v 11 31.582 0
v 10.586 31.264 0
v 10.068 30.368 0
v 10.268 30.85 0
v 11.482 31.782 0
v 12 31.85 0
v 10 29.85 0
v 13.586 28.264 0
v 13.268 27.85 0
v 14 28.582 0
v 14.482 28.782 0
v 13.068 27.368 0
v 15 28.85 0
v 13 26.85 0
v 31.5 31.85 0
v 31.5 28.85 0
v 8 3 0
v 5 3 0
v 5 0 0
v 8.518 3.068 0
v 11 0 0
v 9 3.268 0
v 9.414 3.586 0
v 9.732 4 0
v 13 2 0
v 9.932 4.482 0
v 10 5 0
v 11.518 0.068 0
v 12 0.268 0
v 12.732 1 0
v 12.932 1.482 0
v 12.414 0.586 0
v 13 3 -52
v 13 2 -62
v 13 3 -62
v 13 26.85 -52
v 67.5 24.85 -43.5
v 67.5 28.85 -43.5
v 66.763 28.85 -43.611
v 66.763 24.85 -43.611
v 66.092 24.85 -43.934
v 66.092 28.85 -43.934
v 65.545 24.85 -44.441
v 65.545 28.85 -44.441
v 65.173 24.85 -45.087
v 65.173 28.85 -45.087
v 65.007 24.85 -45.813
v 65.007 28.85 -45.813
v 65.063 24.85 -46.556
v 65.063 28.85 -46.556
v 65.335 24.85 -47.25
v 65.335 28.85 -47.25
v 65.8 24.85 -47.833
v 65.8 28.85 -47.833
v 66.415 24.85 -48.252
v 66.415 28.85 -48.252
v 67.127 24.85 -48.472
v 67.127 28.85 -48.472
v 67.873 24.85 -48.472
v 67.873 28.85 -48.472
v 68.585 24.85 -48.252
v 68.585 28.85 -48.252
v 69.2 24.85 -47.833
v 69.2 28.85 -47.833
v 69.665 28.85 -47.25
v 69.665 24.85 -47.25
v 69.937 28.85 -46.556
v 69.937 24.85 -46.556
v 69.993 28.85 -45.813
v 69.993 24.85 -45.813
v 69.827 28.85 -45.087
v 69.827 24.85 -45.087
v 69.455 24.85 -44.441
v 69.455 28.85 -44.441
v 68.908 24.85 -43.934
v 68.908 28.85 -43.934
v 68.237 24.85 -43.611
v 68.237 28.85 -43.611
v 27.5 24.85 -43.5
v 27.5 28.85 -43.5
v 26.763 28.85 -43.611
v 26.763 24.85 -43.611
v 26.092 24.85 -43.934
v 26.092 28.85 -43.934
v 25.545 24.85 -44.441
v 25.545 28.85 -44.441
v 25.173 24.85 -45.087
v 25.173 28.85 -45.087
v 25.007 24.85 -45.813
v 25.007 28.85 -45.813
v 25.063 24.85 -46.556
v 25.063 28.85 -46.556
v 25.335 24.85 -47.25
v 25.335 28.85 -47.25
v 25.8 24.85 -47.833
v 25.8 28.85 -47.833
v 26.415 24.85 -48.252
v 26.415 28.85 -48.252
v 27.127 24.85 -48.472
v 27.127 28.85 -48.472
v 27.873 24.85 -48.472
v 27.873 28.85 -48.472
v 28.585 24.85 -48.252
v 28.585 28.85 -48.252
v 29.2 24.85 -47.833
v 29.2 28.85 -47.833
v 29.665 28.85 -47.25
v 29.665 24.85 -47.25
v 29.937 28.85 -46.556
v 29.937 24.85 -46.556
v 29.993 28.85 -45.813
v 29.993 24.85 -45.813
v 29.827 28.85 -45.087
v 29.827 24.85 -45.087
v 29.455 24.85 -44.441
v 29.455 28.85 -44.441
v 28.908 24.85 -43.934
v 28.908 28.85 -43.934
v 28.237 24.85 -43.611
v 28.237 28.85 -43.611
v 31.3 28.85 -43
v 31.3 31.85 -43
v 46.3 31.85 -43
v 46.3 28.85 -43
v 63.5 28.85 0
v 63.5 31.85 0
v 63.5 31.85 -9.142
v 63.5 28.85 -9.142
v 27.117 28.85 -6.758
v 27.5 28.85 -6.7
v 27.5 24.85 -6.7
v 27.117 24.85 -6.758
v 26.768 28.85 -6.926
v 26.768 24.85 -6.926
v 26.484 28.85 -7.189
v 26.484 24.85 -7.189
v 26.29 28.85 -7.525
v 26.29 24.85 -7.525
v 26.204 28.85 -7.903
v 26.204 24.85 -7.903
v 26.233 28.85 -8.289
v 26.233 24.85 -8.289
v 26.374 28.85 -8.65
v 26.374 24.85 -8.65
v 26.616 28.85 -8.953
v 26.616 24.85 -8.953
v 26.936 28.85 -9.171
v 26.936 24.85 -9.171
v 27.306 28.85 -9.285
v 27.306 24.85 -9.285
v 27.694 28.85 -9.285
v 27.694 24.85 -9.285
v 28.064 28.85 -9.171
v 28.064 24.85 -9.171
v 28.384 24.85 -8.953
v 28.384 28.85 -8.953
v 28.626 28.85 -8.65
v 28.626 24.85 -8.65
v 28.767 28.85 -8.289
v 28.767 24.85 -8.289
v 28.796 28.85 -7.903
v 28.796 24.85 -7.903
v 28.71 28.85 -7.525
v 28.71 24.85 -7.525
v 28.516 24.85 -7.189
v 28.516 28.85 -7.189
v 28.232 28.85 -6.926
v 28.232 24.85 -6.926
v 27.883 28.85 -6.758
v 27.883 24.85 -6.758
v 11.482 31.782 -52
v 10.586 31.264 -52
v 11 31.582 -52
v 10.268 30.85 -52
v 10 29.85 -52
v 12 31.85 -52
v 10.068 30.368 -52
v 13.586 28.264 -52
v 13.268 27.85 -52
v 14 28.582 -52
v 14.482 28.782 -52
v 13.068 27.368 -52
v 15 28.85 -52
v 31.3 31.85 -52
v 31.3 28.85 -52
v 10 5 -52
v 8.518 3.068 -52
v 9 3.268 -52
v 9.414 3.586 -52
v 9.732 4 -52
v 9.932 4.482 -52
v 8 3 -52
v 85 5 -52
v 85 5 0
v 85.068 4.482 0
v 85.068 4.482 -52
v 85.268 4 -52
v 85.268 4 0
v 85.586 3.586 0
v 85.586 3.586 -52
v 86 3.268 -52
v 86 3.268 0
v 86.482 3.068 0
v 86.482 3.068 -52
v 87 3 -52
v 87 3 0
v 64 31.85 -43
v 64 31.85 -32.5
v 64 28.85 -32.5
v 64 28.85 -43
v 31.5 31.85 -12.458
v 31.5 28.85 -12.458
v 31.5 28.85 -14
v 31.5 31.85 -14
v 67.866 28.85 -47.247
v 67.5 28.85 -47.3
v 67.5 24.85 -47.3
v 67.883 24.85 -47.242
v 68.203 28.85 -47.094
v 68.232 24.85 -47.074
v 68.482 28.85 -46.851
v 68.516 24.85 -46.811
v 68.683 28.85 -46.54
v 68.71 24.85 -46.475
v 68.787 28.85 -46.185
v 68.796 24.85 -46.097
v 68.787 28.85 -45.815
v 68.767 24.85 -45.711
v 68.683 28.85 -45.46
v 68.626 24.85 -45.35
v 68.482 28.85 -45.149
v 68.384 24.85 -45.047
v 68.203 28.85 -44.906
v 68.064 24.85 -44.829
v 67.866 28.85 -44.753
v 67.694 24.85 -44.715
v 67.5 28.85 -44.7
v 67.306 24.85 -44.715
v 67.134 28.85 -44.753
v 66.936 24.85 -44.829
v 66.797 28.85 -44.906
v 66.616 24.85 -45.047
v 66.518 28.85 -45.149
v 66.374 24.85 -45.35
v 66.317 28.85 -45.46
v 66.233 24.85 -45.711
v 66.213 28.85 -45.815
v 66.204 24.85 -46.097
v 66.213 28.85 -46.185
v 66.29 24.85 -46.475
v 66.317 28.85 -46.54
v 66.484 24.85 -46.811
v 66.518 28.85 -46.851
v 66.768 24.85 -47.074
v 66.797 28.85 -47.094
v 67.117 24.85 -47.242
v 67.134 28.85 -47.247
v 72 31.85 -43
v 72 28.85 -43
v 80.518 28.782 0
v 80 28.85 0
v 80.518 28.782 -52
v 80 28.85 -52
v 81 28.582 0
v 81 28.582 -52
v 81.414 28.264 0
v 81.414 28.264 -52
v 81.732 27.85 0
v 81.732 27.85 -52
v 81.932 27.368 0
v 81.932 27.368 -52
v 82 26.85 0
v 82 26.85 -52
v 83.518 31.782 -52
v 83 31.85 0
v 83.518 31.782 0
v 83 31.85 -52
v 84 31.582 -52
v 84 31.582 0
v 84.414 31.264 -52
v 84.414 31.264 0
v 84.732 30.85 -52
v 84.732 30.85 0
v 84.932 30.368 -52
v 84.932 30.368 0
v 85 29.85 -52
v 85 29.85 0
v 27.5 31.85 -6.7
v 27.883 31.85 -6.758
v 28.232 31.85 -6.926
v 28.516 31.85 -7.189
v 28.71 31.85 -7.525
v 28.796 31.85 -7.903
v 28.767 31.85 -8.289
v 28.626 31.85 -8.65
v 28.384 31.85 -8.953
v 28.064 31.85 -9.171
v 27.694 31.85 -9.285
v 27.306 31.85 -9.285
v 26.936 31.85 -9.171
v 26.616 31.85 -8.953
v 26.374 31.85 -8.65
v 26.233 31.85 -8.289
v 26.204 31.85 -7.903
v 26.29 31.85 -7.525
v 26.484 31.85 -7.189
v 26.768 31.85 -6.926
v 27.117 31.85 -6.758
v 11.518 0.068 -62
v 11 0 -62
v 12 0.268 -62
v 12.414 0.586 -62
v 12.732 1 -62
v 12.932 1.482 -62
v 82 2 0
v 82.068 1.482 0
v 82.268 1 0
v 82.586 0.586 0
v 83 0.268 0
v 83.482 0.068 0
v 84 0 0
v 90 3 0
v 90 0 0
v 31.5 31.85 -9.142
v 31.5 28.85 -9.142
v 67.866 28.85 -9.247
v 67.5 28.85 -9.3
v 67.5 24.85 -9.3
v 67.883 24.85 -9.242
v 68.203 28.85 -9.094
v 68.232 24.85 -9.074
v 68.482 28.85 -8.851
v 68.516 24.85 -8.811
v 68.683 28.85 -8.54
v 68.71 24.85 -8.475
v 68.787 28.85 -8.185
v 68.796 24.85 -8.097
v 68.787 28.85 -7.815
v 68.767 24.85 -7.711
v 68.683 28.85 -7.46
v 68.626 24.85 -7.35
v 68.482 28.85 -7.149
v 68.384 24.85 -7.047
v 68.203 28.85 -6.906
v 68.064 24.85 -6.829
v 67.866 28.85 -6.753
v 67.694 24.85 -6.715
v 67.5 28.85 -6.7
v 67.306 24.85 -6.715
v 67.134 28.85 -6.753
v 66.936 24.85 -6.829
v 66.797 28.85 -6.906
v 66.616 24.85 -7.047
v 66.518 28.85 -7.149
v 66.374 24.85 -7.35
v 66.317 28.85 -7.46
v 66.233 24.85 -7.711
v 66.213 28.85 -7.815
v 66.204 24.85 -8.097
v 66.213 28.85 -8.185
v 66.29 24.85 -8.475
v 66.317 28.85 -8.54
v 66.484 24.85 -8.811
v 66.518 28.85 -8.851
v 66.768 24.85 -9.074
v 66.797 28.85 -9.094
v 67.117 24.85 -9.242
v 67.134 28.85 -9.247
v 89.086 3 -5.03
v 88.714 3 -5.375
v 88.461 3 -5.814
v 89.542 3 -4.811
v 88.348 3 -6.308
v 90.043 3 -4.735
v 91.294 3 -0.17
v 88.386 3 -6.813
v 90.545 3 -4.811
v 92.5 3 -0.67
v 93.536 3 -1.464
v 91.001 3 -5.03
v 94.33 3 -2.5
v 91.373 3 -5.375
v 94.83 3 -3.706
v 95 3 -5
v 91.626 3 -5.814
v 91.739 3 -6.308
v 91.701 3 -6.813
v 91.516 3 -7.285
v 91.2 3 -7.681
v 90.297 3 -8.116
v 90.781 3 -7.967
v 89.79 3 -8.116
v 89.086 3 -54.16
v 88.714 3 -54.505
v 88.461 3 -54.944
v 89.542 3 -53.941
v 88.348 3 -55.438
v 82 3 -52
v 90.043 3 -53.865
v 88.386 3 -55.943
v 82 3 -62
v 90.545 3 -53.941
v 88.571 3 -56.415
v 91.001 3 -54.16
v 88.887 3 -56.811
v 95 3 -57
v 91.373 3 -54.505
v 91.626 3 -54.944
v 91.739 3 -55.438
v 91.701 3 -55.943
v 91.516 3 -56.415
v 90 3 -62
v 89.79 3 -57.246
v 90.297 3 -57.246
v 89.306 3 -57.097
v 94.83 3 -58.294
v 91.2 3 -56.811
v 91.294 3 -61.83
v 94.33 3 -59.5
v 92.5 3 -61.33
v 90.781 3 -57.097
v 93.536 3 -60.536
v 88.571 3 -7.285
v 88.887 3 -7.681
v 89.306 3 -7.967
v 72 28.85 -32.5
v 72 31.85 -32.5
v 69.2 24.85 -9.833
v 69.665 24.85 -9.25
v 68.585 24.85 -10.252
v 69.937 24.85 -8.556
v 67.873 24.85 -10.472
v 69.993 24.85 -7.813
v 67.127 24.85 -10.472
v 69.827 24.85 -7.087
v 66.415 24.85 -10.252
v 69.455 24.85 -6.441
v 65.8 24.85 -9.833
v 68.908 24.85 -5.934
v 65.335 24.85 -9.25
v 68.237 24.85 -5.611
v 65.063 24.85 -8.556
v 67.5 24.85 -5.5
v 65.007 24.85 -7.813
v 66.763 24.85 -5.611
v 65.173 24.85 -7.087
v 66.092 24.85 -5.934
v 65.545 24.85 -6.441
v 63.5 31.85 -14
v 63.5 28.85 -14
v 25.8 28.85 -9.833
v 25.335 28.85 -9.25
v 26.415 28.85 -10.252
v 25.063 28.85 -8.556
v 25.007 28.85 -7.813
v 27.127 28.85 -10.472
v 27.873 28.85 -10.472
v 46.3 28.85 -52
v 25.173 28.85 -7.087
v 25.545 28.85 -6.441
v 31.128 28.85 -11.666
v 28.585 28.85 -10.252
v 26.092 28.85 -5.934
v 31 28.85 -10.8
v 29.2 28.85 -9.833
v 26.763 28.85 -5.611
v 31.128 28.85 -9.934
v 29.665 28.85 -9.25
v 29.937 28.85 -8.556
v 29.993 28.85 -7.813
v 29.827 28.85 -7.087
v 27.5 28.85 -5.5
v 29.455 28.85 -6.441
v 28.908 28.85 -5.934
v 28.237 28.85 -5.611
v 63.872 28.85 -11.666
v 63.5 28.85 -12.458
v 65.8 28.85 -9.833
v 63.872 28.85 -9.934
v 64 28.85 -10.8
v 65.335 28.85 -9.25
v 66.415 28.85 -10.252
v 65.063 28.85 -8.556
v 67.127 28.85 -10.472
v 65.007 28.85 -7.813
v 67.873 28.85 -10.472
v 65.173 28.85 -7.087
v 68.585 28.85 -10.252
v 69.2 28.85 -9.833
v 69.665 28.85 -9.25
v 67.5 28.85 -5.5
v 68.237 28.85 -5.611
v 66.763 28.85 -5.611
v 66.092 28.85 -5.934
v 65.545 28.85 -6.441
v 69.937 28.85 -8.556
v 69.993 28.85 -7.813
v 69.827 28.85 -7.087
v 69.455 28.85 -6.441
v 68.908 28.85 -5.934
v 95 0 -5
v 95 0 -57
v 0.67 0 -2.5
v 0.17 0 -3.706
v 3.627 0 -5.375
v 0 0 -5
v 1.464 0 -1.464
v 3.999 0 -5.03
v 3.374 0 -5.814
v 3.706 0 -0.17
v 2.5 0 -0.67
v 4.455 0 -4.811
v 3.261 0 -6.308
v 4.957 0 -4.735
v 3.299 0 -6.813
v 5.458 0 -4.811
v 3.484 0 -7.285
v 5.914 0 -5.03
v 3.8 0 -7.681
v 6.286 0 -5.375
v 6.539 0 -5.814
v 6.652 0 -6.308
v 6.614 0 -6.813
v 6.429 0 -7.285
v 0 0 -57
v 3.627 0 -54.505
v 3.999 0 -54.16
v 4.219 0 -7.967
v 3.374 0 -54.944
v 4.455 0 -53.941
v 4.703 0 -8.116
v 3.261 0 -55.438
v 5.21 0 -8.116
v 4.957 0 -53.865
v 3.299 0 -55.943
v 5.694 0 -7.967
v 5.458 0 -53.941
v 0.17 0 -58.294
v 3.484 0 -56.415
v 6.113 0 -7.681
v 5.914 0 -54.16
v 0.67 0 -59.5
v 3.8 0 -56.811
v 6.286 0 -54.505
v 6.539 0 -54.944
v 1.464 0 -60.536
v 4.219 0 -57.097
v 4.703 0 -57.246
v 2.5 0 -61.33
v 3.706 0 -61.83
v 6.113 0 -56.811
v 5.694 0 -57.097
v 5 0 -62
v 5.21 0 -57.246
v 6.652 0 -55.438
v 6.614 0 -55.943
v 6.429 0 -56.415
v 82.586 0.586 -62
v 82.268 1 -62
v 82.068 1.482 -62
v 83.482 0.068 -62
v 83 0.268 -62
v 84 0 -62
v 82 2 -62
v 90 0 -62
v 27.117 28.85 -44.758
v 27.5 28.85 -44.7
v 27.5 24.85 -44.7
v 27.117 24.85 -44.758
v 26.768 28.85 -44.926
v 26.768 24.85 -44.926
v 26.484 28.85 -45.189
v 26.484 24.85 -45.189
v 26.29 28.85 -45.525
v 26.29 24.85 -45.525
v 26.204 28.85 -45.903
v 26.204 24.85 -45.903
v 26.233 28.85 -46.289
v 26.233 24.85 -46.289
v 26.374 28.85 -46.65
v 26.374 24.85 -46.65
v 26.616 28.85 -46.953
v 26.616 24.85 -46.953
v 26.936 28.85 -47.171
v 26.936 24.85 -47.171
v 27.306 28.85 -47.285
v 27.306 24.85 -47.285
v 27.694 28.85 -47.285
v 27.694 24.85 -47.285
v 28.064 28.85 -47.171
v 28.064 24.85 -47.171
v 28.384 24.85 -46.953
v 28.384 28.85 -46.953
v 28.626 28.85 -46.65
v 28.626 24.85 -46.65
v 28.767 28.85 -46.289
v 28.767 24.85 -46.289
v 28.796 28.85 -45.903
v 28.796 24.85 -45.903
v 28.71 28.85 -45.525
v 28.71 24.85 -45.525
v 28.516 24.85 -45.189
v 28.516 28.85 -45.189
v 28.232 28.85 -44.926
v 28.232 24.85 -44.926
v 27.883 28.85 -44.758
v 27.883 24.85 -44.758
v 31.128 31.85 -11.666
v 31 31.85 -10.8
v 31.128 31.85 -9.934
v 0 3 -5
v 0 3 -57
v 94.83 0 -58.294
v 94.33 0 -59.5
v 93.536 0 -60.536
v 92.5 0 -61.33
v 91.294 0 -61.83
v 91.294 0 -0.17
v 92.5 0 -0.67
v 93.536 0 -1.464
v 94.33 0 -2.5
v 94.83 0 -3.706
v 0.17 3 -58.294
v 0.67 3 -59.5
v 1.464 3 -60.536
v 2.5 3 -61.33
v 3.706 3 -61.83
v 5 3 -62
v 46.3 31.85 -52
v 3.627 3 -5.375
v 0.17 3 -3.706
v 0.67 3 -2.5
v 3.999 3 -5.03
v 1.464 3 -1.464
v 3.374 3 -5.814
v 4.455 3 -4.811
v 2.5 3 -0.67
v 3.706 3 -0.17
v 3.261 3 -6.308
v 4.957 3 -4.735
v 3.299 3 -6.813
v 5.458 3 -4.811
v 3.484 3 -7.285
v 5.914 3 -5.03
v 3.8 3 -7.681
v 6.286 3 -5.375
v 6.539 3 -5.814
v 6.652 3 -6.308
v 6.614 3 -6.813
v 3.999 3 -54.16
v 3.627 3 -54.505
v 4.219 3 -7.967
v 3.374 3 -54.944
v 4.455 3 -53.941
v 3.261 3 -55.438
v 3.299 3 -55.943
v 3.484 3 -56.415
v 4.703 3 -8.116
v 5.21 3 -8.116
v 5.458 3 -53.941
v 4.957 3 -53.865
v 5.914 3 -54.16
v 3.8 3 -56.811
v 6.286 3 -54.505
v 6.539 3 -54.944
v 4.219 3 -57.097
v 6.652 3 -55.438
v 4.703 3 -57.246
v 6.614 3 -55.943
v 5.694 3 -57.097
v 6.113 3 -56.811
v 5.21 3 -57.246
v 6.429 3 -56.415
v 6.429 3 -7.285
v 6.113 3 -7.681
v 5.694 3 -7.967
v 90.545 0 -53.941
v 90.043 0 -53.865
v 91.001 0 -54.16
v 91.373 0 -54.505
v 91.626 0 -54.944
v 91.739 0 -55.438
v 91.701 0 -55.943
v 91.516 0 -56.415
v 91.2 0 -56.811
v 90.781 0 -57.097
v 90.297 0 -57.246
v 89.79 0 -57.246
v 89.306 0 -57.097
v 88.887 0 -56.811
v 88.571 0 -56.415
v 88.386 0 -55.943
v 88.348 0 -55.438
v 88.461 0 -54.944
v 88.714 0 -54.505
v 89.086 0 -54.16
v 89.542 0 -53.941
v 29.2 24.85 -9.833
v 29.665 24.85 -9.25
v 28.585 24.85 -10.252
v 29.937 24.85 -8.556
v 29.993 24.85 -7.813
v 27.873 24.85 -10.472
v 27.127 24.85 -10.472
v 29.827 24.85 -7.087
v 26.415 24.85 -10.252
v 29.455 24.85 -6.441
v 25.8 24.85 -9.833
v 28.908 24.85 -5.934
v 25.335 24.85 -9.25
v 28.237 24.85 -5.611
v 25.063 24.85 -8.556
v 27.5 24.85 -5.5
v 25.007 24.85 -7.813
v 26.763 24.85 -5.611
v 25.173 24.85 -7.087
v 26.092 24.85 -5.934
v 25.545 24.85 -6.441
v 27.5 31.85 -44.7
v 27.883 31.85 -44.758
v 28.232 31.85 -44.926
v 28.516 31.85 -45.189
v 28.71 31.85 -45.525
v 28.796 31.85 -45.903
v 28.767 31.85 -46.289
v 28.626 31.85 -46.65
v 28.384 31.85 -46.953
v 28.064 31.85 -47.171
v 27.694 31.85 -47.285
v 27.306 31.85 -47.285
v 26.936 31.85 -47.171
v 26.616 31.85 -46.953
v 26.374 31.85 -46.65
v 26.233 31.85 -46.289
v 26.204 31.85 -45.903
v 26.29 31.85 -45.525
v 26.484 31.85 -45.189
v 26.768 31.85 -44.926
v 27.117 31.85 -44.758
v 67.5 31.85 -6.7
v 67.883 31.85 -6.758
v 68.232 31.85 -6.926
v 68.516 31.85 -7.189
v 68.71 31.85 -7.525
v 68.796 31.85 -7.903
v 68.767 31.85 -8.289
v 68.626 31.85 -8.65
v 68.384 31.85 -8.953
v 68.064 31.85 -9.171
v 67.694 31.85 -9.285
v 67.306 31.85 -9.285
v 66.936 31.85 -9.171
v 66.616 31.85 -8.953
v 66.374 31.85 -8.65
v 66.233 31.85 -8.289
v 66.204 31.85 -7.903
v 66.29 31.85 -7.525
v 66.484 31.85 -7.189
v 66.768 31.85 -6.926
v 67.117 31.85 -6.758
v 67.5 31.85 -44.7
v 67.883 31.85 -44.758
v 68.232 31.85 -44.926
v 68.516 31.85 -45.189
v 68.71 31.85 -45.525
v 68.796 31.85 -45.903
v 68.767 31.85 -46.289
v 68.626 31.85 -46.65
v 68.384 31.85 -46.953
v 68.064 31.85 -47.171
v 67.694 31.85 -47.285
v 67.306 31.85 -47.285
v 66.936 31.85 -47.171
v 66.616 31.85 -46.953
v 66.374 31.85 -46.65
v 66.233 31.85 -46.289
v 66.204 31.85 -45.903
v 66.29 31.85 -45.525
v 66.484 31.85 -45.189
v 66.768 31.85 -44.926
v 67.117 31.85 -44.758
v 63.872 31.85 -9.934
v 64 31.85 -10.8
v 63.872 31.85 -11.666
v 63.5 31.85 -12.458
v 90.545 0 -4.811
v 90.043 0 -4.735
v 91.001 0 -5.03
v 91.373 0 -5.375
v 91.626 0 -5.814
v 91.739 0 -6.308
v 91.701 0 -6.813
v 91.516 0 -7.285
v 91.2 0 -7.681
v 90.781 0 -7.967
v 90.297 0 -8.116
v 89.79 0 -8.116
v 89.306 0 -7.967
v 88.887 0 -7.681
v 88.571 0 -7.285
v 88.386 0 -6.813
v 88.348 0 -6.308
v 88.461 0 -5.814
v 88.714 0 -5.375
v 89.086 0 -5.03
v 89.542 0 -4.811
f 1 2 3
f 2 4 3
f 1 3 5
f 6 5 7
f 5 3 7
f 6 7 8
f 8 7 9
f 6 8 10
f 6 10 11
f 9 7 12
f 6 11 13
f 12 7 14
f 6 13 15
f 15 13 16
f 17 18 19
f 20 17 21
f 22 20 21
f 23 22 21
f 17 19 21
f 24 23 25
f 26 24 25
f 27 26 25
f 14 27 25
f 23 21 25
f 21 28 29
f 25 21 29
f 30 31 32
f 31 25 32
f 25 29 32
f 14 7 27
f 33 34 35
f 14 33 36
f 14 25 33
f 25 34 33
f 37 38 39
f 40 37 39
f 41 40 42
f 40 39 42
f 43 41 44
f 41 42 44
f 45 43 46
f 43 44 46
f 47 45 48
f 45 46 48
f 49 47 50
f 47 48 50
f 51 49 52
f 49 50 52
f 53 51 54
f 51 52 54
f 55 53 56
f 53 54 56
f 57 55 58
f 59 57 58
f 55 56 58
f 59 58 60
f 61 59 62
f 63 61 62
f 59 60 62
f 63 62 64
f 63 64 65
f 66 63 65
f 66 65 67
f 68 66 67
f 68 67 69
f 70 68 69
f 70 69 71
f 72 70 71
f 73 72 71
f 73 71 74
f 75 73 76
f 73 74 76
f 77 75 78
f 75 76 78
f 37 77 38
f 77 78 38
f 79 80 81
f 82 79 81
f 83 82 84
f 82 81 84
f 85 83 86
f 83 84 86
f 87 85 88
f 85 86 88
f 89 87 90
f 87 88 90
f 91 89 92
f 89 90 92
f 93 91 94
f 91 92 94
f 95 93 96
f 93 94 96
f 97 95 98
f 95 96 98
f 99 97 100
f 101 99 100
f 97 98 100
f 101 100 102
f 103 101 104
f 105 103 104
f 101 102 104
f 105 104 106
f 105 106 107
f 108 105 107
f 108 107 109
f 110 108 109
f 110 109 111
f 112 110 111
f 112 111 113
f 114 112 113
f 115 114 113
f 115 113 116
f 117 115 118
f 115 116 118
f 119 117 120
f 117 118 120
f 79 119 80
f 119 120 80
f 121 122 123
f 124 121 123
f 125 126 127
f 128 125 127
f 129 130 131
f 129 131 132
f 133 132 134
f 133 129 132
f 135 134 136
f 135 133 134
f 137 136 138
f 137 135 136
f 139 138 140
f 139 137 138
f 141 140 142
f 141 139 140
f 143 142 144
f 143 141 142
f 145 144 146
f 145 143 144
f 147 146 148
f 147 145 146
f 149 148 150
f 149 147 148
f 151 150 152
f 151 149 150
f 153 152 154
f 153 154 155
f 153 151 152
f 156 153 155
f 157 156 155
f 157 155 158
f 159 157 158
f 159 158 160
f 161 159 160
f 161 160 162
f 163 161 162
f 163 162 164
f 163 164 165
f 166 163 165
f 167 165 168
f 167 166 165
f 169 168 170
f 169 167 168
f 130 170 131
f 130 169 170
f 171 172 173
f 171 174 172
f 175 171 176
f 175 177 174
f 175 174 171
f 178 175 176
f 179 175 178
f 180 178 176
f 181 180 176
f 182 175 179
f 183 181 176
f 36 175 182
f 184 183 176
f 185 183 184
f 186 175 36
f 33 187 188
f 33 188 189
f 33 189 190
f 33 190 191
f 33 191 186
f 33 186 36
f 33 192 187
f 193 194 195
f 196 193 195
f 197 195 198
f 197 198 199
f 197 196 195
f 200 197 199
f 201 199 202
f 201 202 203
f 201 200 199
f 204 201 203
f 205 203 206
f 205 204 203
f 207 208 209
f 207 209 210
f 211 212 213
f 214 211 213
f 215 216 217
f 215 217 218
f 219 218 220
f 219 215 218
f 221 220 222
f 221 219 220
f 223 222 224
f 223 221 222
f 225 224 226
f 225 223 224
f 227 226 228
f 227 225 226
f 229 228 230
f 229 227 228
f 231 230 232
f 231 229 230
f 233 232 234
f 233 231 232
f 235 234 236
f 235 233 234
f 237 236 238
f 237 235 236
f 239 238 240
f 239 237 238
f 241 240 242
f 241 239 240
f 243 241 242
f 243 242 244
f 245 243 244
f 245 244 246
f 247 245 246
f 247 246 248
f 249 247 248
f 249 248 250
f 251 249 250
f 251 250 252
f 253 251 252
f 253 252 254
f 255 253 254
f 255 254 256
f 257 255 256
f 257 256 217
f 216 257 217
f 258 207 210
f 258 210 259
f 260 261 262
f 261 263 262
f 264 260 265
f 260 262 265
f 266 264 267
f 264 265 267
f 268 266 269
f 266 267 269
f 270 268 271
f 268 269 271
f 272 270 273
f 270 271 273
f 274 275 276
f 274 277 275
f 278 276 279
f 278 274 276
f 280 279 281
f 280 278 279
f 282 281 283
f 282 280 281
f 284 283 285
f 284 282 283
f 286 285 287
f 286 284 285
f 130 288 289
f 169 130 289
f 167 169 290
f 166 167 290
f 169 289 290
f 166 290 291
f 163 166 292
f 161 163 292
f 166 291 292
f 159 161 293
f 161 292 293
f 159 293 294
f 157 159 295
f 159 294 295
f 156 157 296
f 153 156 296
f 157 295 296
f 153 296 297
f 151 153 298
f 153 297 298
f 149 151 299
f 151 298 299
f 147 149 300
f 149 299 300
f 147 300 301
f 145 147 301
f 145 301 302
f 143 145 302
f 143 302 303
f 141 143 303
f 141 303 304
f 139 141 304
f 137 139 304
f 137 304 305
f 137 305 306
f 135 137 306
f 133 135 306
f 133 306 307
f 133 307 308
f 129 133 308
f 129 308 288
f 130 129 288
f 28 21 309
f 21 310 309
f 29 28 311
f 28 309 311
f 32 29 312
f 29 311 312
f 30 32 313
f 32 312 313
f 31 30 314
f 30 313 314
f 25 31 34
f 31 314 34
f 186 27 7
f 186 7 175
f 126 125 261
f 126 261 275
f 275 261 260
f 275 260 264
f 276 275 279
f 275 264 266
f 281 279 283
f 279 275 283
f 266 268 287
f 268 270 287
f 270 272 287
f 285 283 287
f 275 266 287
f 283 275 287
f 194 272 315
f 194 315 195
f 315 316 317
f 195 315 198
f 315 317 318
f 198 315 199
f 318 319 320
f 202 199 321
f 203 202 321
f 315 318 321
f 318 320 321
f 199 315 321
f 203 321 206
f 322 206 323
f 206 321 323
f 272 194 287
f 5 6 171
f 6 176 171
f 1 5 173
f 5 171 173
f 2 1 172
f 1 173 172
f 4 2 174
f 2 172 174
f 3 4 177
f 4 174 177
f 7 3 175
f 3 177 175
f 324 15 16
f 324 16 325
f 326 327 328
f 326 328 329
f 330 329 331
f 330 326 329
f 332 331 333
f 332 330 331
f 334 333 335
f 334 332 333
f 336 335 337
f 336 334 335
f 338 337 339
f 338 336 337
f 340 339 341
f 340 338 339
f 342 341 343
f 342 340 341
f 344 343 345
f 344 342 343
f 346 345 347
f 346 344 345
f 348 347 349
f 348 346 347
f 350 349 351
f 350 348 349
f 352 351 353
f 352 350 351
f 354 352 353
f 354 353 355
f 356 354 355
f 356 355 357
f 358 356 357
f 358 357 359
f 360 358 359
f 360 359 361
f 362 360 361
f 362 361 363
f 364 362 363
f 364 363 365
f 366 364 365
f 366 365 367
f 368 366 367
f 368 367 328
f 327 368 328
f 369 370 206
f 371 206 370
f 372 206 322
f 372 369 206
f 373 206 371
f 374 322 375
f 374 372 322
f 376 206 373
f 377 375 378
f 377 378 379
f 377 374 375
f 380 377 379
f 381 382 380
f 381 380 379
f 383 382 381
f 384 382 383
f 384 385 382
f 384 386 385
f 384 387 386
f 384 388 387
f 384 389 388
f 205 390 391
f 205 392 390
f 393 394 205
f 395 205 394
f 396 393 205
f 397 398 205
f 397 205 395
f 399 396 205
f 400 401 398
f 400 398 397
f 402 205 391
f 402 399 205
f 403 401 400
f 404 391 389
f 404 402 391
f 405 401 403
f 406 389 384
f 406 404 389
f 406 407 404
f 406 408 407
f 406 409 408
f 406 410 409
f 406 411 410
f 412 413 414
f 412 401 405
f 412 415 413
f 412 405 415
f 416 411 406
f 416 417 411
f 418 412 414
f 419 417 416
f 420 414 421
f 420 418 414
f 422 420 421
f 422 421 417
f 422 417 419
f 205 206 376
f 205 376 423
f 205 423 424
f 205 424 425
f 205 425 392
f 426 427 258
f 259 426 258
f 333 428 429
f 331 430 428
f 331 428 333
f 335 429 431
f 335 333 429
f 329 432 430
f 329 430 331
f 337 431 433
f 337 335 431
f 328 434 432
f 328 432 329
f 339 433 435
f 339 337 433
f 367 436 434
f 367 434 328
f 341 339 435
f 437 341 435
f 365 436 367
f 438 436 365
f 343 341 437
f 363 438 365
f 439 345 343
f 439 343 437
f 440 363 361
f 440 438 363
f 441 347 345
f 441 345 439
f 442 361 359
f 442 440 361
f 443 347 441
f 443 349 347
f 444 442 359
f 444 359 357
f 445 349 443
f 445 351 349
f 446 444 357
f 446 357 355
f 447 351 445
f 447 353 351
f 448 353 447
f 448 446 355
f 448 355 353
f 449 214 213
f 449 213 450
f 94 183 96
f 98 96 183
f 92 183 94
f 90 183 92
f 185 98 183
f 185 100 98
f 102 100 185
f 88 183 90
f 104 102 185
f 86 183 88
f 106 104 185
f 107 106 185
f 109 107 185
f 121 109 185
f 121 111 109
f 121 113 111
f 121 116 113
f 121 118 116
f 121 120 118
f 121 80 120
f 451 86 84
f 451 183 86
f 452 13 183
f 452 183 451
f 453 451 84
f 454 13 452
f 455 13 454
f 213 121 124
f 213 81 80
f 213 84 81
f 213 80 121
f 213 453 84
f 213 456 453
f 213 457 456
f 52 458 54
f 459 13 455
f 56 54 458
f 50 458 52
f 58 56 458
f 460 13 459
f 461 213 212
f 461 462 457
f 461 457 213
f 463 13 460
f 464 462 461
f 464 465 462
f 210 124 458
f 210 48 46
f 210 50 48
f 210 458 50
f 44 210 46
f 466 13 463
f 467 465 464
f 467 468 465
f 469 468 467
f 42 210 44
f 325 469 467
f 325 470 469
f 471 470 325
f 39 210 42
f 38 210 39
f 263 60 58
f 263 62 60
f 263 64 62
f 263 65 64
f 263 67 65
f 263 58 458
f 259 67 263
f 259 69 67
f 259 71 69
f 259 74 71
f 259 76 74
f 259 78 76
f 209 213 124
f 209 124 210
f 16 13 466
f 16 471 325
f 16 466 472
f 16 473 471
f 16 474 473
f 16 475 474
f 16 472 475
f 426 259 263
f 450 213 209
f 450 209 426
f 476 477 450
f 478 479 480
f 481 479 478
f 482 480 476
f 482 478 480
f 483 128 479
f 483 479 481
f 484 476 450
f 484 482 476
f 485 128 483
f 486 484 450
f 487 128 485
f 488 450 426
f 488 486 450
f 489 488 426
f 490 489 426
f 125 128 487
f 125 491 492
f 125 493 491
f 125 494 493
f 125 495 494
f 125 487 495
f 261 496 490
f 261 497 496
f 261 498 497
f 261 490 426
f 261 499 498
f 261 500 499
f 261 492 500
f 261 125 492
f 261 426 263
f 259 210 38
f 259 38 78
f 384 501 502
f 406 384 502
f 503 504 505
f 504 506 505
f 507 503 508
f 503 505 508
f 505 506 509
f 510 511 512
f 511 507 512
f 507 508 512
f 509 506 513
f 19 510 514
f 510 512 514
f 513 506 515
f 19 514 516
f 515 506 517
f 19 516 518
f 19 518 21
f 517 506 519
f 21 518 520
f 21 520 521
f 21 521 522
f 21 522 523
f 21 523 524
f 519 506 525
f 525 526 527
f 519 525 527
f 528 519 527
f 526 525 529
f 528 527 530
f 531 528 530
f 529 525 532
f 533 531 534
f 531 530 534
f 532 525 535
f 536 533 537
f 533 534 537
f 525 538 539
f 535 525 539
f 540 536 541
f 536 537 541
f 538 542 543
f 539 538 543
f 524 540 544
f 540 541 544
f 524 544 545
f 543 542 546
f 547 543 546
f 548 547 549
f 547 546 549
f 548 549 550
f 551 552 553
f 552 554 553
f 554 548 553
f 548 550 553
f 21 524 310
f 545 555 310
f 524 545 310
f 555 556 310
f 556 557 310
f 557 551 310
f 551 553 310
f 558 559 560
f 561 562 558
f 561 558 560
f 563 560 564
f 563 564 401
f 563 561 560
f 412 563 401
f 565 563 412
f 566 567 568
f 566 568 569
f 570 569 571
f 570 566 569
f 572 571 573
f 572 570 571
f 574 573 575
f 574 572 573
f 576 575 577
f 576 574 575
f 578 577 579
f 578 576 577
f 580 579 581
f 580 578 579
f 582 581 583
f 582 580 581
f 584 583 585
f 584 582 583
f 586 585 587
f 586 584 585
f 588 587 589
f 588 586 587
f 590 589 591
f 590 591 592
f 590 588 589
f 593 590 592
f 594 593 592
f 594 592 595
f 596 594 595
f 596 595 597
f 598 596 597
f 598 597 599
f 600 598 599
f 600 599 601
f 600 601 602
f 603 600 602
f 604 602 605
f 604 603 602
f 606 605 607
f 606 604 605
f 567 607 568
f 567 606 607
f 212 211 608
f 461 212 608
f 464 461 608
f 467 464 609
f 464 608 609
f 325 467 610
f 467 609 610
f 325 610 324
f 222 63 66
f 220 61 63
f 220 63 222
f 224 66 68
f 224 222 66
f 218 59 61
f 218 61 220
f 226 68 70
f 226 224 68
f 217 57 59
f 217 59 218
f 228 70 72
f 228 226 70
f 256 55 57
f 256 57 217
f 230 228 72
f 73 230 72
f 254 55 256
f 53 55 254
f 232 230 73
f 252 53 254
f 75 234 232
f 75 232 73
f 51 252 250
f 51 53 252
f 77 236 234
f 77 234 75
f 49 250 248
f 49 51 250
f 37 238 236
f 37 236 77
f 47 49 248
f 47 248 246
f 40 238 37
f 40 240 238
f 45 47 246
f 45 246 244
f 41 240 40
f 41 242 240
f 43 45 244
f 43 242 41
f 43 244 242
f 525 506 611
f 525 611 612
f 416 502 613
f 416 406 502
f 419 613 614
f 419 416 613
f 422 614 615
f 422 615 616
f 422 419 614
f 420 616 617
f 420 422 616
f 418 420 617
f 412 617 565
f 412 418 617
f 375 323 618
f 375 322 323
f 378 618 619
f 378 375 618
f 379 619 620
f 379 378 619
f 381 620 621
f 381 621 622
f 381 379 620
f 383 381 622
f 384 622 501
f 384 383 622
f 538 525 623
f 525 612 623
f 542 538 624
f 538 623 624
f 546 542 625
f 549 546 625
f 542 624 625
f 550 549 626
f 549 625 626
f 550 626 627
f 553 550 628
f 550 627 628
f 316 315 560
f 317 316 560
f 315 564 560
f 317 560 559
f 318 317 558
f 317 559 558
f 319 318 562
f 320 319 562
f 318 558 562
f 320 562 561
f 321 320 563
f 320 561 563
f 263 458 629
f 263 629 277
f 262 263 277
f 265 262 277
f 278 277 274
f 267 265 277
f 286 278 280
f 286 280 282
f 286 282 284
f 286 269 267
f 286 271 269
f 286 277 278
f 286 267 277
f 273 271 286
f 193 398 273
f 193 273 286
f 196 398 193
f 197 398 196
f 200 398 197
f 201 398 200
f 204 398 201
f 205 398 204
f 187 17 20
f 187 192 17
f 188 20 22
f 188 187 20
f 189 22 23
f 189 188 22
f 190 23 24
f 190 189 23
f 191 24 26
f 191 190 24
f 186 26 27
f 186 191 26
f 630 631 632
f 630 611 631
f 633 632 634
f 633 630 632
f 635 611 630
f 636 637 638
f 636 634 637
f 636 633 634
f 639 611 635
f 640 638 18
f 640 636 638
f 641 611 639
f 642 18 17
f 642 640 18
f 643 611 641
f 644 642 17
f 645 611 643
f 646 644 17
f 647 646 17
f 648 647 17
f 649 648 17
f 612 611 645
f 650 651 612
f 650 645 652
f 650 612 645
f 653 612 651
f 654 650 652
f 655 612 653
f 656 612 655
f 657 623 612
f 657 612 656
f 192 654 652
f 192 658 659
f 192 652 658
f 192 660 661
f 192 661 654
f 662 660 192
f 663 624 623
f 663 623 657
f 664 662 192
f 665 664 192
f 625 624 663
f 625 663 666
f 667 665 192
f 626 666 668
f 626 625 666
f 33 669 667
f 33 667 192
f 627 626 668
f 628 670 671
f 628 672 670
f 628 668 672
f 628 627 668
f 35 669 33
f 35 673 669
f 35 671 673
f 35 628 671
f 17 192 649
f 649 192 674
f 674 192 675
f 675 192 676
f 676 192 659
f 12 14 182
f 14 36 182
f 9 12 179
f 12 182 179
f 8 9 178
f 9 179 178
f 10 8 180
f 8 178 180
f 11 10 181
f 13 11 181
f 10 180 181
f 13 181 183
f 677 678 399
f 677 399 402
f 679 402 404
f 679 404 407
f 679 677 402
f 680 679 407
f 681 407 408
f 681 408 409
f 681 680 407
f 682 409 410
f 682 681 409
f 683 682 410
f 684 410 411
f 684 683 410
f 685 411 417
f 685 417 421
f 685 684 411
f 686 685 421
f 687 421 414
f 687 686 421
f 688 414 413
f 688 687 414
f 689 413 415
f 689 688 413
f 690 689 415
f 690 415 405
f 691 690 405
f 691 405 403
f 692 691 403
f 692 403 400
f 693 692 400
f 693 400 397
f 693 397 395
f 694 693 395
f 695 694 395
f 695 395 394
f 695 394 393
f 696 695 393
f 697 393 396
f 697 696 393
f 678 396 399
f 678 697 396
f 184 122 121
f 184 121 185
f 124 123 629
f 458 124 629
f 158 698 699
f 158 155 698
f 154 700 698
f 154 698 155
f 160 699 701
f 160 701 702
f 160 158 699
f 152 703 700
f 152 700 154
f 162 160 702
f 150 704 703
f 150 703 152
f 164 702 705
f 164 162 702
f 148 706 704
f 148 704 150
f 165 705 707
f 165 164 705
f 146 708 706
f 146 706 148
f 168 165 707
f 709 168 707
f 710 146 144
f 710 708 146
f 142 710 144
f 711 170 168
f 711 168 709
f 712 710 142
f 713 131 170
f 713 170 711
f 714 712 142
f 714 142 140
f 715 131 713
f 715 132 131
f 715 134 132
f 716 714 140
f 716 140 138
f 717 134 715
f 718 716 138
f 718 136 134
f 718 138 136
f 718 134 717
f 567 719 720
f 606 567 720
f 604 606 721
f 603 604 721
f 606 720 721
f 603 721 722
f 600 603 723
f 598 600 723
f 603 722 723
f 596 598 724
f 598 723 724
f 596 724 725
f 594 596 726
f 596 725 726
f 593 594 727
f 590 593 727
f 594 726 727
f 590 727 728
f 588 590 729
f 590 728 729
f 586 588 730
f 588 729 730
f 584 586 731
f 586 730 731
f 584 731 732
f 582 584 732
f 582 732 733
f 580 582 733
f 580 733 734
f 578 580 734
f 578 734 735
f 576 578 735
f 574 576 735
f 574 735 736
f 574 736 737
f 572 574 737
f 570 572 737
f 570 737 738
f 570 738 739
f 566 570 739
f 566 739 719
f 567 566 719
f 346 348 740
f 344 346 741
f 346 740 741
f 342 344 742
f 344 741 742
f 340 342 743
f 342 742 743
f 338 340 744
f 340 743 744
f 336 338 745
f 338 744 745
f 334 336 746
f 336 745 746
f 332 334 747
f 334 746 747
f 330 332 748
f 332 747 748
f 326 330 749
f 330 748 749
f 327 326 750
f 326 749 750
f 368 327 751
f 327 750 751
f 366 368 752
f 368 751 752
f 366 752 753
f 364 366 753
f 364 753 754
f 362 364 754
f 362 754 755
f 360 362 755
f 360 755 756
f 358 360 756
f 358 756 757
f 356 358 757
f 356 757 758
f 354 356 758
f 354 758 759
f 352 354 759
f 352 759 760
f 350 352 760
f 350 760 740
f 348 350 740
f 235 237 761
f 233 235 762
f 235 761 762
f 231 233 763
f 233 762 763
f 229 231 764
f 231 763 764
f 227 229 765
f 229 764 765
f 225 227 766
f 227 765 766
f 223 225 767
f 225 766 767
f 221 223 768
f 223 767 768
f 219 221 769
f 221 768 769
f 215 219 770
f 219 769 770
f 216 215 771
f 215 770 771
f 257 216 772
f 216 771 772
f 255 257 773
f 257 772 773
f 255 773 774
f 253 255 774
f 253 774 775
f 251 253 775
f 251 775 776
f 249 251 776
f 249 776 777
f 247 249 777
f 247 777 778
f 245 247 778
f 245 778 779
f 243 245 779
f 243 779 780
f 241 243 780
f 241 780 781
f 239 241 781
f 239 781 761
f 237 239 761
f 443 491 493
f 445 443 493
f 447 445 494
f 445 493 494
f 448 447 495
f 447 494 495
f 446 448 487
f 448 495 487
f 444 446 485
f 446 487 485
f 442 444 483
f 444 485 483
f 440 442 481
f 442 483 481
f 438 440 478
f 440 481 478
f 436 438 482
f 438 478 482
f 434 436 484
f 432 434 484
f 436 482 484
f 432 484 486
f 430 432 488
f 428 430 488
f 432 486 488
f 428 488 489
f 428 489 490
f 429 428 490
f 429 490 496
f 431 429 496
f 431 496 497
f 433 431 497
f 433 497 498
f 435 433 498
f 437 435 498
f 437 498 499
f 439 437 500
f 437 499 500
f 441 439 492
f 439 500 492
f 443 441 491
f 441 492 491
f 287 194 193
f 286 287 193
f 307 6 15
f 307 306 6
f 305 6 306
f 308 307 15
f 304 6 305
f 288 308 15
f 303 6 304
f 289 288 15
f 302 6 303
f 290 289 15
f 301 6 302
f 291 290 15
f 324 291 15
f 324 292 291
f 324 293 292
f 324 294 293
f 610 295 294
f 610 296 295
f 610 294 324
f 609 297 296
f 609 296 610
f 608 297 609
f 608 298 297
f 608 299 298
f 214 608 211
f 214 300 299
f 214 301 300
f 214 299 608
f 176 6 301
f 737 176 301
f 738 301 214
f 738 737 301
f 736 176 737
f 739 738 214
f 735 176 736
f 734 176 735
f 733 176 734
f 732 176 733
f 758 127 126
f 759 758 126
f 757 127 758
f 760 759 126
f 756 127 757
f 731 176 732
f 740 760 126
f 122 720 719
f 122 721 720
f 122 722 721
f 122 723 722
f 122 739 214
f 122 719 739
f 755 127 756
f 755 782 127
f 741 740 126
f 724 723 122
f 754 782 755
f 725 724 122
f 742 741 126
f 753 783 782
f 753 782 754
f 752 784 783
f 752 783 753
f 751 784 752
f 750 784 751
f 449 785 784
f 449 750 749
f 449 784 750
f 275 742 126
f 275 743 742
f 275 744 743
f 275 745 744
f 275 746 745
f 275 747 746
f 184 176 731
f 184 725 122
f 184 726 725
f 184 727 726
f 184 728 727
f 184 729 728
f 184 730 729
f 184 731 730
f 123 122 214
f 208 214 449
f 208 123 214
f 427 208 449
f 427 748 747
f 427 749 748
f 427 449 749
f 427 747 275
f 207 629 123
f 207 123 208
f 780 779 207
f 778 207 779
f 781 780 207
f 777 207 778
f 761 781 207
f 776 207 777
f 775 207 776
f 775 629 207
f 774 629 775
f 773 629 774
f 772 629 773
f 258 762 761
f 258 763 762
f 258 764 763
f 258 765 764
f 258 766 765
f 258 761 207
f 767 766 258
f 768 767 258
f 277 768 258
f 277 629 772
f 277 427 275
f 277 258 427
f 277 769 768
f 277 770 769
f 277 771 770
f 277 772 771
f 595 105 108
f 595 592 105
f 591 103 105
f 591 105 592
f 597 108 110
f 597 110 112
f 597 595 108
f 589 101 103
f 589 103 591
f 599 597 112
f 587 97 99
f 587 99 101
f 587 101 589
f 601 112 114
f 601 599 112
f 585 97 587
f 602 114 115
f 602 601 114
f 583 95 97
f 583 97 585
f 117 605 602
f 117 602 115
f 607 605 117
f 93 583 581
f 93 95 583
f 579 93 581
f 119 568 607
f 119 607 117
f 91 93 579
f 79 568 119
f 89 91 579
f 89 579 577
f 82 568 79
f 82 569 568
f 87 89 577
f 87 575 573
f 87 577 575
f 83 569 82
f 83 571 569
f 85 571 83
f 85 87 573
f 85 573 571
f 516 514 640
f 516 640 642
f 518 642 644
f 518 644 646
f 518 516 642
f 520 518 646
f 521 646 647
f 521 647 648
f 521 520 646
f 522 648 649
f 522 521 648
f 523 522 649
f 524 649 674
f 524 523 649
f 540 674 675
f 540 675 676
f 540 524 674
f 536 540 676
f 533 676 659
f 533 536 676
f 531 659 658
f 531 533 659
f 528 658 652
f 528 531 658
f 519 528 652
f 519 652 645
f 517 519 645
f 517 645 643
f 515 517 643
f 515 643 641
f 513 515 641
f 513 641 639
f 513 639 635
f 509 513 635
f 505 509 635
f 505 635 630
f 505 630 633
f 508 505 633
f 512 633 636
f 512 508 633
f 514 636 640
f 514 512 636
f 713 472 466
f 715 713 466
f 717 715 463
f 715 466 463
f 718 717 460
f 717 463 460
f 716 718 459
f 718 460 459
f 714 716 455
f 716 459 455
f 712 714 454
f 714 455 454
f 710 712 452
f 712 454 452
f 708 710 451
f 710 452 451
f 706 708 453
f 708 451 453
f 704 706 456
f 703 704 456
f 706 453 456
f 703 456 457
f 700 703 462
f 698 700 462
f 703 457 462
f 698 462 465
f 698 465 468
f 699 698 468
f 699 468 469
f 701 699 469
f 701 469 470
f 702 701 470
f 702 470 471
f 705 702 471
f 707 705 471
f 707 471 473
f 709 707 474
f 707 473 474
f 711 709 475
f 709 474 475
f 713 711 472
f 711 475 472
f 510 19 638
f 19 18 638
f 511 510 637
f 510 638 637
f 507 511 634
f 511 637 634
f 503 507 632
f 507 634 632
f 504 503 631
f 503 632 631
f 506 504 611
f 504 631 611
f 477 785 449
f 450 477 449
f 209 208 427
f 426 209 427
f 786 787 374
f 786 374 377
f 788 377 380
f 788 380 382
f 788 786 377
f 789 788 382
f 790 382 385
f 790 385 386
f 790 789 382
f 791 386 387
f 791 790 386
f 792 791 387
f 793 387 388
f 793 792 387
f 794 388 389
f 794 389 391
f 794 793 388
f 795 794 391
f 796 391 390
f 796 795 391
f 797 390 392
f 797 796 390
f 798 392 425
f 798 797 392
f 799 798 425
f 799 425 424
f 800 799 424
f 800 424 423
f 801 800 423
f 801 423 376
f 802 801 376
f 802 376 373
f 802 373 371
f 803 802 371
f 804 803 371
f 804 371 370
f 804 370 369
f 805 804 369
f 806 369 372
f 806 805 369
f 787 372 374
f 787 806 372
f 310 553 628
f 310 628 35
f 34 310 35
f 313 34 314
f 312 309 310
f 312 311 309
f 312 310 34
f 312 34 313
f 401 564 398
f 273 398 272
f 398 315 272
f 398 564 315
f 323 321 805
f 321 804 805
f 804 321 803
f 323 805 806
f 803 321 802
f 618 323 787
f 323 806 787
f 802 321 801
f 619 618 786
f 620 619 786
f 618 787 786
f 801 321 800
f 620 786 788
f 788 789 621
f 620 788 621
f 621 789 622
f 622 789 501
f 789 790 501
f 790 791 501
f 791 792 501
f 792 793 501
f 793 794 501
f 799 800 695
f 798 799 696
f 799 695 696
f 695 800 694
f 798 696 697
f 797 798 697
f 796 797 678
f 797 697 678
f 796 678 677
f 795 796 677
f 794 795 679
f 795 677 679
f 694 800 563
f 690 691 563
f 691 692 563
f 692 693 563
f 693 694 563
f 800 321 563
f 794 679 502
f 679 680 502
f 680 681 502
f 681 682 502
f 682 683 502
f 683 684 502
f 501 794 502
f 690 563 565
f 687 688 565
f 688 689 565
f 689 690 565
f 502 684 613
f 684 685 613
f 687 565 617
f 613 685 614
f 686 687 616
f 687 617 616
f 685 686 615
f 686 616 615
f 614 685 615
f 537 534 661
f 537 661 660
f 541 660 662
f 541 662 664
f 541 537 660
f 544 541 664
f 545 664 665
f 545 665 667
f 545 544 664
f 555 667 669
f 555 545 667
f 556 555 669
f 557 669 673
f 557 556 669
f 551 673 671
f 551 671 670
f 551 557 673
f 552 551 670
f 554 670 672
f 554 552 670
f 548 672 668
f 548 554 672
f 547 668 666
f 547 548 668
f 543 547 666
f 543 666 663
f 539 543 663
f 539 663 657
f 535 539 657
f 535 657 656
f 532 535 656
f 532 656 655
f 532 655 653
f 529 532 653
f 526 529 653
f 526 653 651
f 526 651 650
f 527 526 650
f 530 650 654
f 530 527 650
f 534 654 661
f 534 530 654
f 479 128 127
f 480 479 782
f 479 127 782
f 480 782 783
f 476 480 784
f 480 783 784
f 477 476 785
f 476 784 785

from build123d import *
from build123d.topology import SkipClean

# Parameters (mm, degrees)
SKETCH1_W           = 95
SKETCH1_H           = 62
SKETCH1_R           = 1.7
BOSS_EXTRUDE1_DEPTH = 3
SKETCH2_W           = 75
SKETCH2_H           = 52
BOSS_EXTRUDE2_DEPTH = 28.85
SKETCH3_W           = 69
SKETCH3_H           = 25.85
CUT_EXTRUDE1_DEPTH  = 118.827935991
SKETCH4_W           = 69
SKETCH4_H           = 3
CUT_EXTRUDE2_DEPTH  = 118.827935991
SKETCH5_R           = 1.3
SKETCH5_W           = 32
SKETCH5_H           = 14
CUT_EXTRUDE3_DEPTH  = 118.827935991
SKETCH7_R           = 3
CUT_EXTRUDE5_DEPTH  = 118.827935991
SKETCH6_W           = 15
SKETCH6_H           = 9
SKETCH6_W_2         = 8
SKETCH6_H_2         = 10.5
CUT_EXTRUDE4_DEPTH  = 118.827935991
FILLET1_R           = 2
SKETCH8_R           = 2.5
SKETCH8_R_2         = 1.3
BOSS_EXTRUDE4_DEPTH = 4
FILLET2_R           = 5


with BuildPart() as part:
    # Sketch1 → Boss-Extrude1 (new body)
    with BuildSketch(Plane(origin=(0, 0, 0), x_dir=(1, 0, 0), z_dir=(0, 1, 0))):
        with Locations((47.5, 31)):
            Rectangle(SKETCH1_W, SKETCH1_H)
        with Locations(Location((90.04349796, 55.565, 0), (0, 0, 270))):
            Circle(SKETCH1_R, mode=Mode.SUBTRACT)
        with Locations(Location((90.04349796, 6.435, 0), (0, 0, 270))):
            Circle(SKETCH1_R, mode=Mode.SUBTRACT)
        with Locations(Location((4.95650204, 55.565, 0), (0, 0, 270))):
            Circle(SKETCH1_R, mode=Mode.SUBTRACT)
        with Locations(Location((4.95650204, 6.435, 0), (0, 0, 270))):
            Circle(SKETCH1_R, mode=Mode.SUBTRACT)
    extrude(amount=BOSS_EXTRUDE1_DEPTH)

    # Sketch2 → Boss-Extrude2 (add)
    with BuildSketch(Plane(origin=(0, 3, 0), x_dir=(1, 0, 0), z_dir=(0, 1, 0))):
        with Locations((47.5, 26)):
            Rectangle(SKETCH2_W, SKETCH2_H)
    extrude(amount=BOSS_EXTRUDE2_DEPTH)

    # Sketch3 → Cut-Extrude1 (cut, through all)
    with BuildSketch(Plane.XY):
        with Locations((47.5, 15.925)):
            Rectangle(SKETCH3_W, SKETCH3_H)
    extrude(amount=-CUT_EXTRUDE1_DEPTH, mode=Mode.SUBTRACT)

    # Sketch4 → Cut-Extrude2 (cut, through all)
    with BuildSketch(Plane.XY):
        with Locations((47.5, 1.5)):
            Rectangle(SKETCH4_W, SKETCH4_H)
    extrude(amount=-CUT_EXTRUDE2_DEPTH, mode=Mode.SUBTRACT)

    # Sketch5 → Cut-Extrude3 (cut, through all)
    with BuildSketch(Plane(origin=(0, 31.85, 0), x_dir=(1, 0, 0), z_dir=(0, 1, 0))):
        with Locations(Location((27.5, 46, 0), (0, 0, 270))):
            Circle(SKETCH5_R)
        with Locations(Location((27.5, 8, 0), (0, 0, 270))):
            Circle(SKETCH5_R)
        with Locations(Location((67.5, 8, 0), (0, 0, 270))):
            Circle(SKETCH5_R)
        with Locations(Location((67.5, 46, 0), (0, 0, 270))):
            Circle(SKETCH5_R)
        with Locations((47.5, 7)):
            Rectangle(SKETCH5_W, SKETCH5_H)
    extrude(amount=-CUT_EXTRUDE3_DEPTH, mode=Mode.SUBTRACT)

    # Sketch7 → Cut-Extrude5 (cut, through all)
    with BuildSketch(Plane(origin=(0, 31.85, 0), x_dir=(1, 0, 0), z_dir=(0, 1, 0))):
        with Locations((34, 10.8)):
            Circle(SKETCH7_R)
        with Locations((61, 10.8)):
            Circle(SKETCH7_R)
    extrude(amount=-CUT_EXTRUDE5_DEPTH, mode=Mode.SUBTRACT)

    # Sketch6 → Cut-Extrude4 (cut, through all)
    with BuildSketch(Plane(origin=(0, 31.85, 0), x_dir=(1, 0, 0), z_dir=(0, 1, 0))):
        with Locations((38.8, 47.5)):
            Rectangle(SKETCH6_W, SKETCH6_H)
        with Locations((68, 37.75)):
            Rectangle(SKETCH6_W_2, SKETCH6_H_2)
    extrude(amount=-CUT_EXTRUDE4_DEPTH, mode=Mode.SUBTRACT)

    # Fillet1
    fillet1_edges = [part.edges().sort_by_distance(p)[0] for p in [
        (10, 3, -26),
        (85, 3, -26),
        (10, 31.85, -26),
        (85, 31.85, -26),
        (13, 28.85, -26),
        (82, 28.85, -26),
        (13, 0, -31),
        (82, 0, -31),
    ]]
    fillet(fillet1_edges, radius=FILLET1_R)

    # Sketch8 → Boss-Extrude4 (add)
    # profile 1 of 4: a face of its own
    with SkipClean():  # the faces are left unmerged after this step: merging them gives an invalid solid
        with BuildSketch(Plane.XZ.offset(-28.85)):
            with Locations(Location((27.5, -8, 0), (0, 0, 90))):
                Circle(SKETCH8_R)
            with Locations(Location((27.5, -8, 0), (0, 0, 90))):
                Circle(SKETCH8_R_2, mode=Mode.SUBTRACT)
        # profile 2 of 4: a face of its own
        with BuildSketch(Plane.XZ.offset(-28.85)):
            with Locations(Location((67.5, -8, 0), (0, 0, 90))):
                Circle(SKETCH8_R)
            with Locations(Location((67.5, -8, 0), (0, 0, 270))):
                Circle(SKETCH8_R_2, mode=Mode.SUBTRACT)
        # profile 3 of 4: a face of its own
        with BuildSketch(Plane.XZ.offset(-28.85)):
            with Locations(Location((27.5, -46, 0), (0, 0, 90))):
                Circle(SKETCH8_R)
            with Locations(Location((27.5, -46, 0), (0, 0, 90))):
                Circle(SKETCH8_R_2, mode=Mode.SUBTRACT)
        # profile 4 of 4: a face of its own
        with BuildSketch(Plane.XZ.offset(-28.85)):
            with Locations(Location((67.5, -46, 0), (0, 0, 90))):
                Circle(SKETCH8_R)
            with Locations(Location((67.5, -46, 0), (0, 0, 270))):
                Circle(SKETCH8_R_2, mode=Mode.SUBTRACT)
        extrude(amount=BOSS_EXTRUDE4_DEPTH)

    # Fillet2
    fillet2_edges = [part.edges().sort_by_distance(p)[0] for p in [
        (0, 1.5, -62),
        (95, 1.5, -62),
        (95, 1.5, 0),
        (0, 1.5, 0),
    ]]
    fillet(fillet2_edges, radius=FILLET2_R)


solid = part.part
